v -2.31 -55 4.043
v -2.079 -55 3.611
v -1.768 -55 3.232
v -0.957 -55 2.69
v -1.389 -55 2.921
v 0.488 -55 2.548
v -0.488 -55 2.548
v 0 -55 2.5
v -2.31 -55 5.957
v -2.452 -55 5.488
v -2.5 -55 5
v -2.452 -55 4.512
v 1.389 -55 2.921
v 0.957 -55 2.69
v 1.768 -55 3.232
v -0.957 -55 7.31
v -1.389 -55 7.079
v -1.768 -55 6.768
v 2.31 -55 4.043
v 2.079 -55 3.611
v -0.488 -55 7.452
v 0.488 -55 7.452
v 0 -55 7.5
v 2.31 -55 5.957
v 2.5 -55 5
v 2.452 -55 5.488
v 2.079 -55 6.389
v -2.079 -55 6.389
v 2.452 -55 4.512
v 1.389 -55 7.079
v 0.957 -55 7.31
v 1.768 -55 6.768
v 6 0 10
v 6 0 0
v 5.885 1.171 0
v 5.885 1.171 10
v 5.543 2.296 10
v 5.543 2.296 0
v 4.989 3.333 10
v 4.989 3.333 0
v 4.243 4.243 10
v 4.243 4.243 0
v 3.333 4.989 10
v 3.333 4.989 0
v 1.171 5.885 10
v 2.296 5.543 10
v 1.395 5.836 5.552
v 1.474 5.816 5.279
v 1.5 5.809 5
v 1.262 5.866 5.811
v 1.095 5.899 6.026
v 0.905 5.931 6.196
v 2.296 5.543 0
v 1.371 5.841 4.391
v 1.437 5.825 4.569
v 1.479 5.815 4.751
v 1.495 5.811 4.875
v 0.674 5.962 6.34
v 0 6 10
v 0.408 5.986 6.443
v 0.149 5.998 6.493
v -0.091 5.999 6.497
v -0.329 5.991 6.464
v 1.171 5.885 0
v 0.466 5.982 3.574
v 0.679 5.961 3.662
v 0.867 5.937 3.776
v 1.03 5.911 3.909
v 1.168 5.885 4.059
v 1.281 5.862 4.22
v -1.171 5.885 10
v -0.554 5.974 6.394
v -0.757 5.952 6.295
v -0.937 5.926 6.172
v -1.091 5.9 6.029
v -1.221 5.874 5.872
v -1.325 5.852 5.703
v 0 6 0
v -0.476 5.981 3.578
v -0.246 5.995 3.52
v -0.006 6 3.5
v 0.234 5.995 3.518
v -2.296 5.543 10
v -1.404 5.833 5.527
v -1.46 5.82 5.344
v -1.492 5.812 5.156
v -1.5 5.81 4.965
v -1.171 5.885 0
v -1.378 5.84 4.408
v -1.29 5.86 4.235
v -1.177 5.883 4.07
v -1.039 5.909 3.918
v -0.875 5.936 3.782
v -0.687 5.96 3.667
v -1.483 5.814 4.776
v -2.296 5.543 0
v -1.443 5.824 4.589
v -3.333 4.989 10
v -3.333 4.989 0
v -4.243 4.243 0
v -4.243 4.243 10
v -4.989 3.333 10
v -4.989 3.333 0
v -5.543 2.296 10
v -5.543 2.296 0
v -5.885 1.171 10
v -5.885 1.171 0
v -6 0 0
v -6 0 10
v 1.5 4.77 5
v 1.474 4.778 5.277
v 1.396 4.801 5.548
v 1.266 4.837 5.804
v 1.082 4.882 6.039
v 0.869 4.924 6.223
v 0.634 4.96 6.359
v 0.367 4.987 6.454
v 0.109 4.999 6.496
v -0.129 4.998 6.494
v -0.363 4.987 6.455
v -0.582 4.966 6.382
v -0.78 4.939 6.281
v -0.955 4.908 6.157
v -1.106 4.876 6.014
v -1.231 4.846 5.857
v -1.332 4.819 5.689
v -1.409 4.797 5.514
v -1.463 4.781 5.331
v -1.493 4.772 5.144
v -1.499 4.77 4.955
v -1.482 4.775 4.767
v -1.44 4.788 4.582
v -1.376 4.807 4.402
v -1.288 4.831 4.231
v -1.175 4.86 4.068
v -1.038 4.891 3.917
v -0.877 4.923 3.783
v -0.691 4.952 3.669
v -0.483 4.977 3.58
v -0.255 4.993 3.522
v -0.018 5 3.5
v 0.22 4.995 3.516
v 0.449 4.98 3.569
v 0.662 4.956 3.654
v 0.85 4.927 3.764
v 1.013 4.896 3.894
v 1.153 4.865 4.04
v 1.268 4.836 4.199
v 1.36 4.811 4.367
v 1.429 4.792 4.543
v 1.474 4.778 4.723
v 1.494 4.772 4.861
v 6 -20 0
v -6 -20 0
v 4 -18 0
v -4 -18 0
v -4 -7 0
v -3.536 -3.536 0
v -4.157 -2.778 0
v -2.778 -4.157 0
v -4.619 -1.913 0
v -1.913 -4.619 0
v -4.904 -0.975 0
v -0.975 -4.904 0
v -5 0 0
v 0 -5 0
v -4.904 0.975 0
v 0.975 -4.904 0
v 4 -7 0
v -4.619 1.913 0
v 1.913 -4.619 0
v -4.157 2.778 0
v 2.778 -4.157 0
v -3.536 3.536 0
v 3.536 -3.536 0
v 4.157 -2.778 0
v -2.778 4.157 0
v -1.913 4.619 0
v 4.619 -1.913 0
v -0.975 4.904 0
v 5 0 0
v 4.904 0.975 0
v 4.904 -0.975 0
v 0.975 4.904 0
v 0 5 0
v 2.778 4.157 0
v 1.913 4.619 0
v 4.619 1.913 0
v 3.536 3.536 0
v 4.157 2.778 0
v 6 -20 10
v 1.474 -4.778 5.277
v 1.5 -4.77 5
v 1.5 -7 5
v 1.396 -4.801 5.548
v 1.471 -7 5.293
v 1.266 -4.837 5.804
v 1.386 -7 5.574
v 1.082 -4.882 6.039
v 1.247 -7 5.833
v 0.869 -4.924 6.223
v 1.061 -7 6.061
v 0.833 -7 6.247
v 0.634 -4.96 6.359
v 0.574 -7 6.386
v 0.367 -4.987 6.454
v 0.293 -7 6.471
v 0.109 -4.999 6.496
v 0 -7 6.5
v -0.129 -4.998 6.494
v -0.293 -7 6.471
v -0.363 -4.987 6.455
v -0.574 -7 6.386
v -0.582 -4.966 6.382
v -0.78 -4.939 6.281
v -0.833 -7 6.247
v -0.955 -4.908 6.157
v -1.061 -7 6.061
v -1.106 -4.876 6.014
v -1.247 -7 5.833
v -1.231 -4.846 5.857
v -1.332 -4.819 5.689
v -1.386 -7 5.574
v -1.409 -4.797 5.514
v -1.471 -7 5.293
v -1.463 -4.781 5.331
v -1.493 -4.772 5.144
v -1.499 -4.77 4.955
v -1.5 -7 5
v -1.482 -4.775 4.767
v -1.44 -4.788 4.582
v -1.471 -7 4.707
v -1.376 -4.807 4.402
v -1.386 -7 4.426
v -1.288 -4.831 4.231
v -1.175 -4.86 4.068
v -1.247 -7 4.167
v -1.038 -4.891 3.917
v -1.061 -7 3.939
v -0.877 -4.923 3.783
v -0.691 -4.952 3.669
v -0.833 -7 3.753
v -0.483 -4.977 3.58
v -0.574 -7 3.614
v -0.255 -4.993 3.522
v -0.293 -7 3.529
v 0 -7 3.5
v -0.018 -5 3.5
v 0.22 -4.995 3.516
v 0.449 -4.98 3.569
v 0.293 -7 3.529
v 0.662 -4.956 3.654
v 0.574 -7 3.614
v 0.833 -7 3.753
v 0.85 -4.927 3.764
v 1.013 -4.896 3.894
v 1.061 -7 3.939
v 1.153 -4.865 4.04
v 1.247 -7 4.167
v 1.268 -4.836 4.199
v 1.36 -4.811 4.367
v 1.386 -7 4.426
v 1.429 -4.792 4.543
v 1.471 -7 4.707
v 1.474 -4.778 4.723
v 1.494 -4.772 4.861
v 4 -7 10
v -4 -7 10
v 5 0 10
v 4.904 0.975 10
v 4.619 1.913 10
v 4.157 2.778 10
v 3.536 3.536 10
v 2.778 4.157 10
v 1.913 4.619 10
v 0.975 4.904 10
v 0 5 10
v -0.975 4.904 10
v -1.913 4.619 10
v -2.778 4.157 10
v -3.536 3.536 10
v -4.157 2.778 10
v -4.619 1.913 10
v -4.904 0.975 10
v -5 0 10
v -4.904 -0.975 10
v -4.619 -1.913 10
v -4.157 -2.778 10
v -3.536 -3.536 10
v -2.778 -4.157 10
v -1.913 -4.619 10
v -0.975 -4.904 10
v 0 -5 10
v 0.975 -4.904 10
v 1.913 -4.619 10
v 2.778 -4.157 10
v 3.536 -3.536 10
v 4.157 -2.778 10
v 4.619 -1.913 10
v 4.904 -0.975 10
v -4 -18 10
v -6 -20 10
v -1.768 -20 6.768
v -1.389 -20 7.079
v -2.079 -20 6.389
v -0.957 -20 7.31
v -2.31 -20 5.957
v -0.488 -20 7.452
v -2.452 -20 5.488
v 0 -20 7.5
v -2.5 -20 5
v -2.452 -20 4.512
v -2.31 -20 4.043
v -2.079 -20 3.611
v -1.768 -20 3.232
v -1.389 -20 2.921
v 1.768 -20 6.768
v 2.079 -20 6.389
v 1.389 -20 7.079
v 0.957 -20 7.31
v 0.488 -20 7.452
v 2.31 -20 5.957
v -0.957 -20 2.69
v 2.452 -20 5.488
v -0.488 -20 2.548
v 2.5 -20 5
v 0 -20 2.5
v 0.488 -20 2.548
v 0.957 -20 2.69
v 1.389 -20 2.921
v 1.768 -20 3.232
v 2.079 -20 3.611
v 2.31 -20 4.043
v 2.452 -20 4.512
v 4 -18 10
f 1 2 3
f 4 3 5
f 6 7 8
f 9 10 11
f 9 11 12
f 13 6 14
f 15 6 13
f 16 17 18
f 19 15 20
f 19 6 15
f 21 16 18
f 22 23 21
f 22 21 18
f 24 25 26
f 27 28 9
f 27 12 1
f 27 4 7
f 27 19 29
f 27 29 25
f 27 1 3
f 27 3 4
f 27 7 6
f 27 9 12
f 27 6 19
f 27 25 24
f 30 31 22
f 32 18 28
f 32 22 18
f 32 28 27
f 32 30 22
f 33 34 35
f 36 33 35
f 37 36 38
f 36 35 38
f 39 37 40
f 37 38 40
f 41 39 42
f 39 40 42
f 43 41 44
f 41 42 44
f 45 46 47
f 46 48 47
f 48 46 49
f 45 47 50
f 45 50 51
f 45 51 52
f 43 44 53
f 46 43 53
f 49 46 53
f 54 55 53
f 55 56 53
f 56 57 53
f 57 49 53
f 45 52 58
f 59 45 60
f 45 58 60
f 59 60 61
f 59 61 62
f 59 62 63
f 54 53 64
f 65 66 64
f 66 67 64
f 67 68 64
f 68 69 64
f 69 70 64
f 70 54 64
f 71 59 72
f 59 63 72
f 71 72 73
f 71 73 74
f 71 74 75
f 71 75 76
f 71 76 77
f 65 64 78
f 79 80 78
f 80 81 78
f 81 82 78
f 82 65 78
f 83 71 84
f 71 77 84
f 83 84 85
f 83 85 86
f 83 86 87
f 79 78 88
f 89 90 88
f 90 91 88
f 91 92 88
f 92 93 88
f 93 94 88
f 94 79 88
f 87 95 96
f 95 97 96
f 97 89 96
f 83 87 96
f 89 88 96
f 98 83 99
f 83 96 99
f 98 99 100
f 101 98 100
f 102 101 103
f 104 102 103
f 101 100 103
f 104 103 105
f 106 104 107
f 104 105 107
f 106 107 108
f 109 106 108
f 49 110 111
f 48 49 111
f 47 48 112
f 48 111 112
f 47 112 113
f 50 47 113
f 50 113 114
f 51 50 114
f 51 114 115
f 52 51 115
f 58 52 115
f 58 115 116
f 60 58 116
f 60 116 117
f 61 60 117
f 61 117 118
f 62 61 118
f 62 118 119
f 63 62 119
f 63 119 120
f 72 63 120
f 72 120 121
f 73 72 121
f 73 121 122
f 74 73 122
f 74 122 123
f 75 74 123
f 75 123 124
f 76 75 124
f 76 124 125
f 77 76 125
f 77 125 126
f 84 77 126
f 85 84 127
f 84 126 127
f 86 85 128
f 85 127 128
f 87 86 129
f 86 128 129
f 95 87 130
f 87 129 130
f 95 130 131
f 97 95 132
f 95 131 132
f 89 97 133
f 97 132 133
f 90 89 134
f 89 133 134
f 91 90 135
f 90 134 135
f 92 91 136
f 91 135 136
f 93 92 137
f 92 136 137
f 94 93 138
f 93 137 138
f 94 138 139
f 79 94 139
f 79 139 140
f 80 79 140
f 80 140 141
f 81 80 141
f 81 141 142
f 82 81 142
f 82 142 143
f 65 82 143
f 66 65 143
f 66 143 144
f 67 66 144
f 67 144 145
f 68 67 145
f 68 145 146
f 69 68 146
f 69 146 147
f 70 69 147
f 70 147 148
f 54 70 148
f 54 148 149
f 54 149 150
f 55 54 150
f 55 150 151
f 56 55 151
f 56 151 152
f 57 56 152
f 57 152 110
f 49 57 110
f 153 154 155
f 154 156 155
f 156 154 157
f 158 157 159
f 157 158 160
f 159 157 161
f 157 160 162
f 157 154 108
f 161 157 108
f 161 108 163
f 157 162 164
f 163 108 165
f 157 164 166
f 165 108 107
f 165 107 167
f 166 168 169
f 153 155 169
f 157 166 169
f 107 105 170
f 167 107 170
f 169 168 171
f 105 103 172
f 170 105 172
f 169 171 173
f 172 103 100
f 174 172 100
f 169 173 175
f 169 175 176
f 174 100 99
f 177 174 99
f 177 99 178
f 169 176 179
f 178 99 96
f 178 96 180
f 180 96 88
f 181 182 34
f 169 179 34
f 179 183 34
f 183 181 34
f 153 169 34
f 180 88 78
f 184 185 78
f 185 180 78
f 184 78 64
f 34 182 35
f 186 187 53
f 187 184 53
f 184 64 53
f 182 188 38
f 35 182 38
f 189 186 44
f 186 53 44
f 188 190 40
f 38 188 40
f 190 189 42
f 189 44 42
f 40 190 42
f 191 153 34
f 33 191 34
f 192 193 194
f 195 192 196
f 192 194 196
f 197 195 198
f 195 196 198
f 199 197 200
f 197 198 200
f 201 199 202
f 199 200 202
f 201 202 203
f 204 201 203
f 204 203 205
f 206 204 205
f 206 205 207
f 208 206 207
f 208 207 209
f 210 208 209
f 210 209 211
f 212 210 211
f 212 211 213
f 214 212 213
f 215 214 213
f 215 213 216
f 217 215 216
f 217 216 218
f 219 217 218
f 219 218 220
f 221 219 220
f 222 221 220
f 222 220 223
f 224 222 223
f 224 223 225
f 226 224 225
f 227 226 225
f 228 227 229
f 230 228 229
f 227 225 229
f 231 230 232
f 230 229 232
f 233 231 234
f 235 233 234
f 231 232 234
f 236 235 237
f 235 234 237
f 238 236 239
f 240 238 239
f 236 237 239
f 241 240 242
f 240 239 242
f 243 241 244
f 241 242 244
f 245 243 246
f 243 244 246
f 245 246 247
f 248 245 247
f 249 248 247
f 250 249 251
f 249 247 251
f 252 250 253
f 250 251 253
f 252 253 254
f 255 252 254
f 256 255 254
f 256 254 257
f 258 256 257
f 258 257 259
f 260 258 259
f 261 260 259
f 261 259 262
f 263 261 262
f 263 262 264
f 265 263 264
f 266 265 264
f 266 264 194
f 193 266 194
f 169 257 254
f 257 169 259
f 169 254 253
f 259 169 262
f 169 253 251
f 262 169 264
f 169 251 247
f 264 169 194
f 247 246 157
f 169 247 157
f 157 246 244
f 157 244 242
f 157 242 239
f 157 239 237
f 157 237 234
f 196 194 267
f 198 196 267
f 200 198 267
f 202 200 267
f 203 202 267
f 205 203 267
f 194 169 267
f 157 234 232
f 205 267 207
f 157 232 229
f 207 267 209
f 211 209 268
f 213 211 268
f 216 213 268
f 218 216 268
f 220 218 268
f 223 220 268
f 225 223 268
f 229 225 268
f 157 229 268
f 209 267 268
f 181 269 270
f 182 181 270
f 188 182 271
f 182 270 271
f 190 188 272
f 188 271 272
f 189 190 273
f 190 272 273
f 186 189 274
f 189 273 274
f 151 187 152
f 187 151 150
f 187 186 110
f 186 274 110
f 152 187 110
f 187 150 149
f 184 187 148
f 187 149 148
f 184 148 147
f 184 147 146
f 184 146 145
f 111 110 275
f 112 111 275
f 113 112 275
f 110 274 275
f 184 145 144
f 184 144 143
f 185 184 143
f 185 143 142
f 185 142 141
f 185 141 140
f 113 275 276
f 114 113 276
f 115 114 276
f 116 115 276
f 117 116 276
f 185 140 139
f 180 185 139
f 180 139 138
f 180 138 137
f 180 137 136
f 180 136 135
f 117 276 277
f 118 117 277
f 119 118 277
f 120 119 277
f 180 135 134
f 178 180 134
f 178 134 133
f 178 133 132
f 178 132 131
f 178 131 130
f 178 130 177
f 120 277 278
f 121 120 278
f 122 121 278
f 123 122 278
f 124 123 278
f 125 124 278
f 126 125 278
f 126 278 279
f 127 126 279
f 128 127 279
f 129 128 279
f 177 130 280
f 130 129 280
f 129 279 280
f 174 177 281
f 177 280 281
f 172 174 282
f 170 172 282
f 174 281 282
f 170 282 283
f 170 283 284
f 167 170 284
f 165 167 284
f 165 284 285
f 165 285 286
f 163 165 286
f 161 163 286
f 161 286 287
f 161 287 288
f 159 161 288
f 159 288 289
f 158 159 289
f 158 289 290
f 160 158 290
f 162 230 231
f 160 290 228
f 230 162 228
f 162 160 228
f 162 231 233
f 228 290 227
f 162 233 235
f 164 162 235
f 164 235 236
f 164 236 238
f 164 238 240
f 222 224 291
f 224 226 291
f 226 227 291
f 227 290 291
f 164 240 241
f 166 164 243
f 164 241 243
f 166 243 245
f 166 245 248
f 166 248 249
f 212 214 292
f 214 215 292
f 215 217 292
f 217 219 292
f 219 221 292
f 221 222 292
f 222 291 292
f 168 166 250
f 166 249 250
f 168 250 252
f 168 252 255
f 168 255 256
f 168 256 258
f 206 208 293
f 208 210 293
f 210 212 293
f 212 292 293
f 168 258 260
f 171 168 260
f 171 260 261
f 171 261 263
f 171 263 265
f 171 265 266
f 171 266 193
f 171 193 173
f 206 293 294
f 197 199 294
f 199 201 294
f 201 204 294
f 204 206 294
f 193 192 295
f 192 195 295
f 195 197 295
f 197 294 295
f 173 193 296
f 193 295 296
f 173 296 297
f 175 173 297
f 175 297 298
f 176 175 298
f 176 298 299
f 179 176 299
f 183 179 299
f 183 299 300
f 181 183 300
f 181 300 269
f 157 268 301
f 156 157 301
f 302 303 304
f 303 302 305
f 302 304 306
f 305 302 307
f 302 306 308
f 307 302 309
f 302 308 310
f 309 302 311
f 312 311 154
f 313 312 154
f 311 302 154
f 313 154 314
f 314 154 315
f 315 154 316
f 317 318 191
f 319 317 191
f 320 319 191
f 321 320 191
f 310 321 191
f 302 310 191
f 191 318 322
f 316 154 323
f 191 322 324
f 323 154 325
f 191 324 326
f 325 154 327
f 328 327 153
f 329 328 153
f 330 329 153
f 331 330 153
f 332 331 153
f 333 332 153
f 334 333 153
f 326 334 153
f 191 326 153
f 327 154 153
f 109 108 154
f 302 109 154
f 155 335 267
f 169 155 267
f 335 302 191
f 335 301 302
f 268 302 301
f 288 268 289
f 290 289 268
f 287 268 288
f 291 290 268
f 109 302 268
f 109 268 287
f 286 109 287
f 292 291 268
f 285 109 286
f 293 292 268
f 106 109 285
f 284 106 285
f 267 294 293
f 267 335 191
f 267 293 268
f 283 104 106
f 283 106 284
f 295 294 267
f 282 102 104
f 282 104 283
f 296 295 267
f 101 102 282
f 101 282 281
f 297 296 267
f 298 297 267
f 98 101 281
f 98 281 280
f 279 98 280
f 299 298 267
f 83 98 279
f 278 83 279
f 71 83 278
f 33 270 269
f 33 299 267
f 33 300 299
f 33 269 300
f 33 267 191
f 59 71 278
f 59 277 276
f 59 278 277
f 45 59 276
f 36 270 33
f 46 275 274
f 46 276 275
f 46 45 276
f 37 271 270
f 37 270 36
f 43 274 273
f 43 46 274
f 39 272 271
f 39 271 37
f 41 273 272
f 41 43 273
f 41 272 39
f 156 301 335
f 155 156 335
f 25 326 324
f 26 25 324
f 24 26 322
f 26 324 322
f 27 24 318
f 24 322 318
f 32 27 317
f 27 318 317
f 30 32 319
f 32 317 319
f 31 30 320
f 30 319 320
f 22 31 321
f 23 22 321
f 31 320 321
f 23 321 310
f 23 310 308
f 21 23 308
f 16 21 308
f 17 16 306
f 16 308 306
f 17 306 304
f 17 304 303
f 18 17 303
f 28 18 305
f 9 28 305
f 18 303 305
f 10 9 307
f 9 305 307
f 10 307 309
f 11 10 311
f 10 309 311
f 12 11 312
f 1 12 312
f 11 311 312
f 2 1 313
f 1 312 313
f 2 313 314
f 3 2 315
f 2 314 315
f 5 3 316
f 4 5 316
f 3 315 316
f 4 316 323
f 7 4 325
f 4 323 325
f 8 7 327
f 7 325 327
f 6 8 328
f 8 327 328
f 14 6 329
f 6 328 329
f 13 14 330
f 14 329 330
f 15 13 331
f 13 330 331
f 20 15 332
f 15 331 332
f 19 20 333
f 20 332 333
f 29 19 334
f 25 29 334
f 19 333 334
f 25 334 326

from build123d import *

# Parameters (mm, degrees)
F1_DEPTH = 10
F2_R     = 5
F3_DEPTH = 25
F5_DEPTH = 25
F6_R     = 1.5
F7_DEPTH = 25
F8_R     = 2.5
F9_DEPTH = 35


with BuildPart() as f1:
    # F0 (on Top) → F1 (new body)
    with BuildSketch(Plane.XY):
        with BuildLine():
            ThreePointArc((-6, 0), (0, -6), (6, 0))
            Line((6, 0), (-6, 0))
        make_face()
        with BuildLine():
            Line((-6, 0), (6, 0))
            ThreePointArc((6, 0), (0, 6), (-6, 0))
        make_face()
        with BuildLine():
            Line((6, -20), (6, 0))
            ThreePointArc((6, 0), (0, -6), (-6, 0))
            Line((-6, 0), (-6, -20))
            Line((-6, -20), (6, -20))
        make_face()
    extrude(amount=F1_DEPTH)

    # F2 (on face) → F3 (cut)
    with BuildSketch(Plane.XY.offset(10)):
        Circle(F2_R)
    extrude(amount=-F3_DEPTH, mode=Mode.SUBTRACT)

    # F4 (on face) → F5 (cut)
    with BuildSketch(Plane.XY.offset(10)):
        Polygon((-4, -7), (-4, -18), (4, -18), (4, -7), (0, -7), align=None)
    extrude(amount=-F5_DEPTH, mode=Mode.SUBTRACT)

    # F6 (on face) → F7 (cut)
    with BuildSketch(Plane.XZ.offset(7)):
        with Locations((0, 5)):
            Circle(F6_R)
    extrude(amount=-F7_DEPTH, mode=Mode.SUBTRACT)

    # F8 (on face) → F9 (join)
    with BuildSketch(Plane.XZ.offset(20)):
        with Locations((0, 5)):
            Circle(F8_R)
    extrude(amount=F9_DEPTH)


solid = f1.part
